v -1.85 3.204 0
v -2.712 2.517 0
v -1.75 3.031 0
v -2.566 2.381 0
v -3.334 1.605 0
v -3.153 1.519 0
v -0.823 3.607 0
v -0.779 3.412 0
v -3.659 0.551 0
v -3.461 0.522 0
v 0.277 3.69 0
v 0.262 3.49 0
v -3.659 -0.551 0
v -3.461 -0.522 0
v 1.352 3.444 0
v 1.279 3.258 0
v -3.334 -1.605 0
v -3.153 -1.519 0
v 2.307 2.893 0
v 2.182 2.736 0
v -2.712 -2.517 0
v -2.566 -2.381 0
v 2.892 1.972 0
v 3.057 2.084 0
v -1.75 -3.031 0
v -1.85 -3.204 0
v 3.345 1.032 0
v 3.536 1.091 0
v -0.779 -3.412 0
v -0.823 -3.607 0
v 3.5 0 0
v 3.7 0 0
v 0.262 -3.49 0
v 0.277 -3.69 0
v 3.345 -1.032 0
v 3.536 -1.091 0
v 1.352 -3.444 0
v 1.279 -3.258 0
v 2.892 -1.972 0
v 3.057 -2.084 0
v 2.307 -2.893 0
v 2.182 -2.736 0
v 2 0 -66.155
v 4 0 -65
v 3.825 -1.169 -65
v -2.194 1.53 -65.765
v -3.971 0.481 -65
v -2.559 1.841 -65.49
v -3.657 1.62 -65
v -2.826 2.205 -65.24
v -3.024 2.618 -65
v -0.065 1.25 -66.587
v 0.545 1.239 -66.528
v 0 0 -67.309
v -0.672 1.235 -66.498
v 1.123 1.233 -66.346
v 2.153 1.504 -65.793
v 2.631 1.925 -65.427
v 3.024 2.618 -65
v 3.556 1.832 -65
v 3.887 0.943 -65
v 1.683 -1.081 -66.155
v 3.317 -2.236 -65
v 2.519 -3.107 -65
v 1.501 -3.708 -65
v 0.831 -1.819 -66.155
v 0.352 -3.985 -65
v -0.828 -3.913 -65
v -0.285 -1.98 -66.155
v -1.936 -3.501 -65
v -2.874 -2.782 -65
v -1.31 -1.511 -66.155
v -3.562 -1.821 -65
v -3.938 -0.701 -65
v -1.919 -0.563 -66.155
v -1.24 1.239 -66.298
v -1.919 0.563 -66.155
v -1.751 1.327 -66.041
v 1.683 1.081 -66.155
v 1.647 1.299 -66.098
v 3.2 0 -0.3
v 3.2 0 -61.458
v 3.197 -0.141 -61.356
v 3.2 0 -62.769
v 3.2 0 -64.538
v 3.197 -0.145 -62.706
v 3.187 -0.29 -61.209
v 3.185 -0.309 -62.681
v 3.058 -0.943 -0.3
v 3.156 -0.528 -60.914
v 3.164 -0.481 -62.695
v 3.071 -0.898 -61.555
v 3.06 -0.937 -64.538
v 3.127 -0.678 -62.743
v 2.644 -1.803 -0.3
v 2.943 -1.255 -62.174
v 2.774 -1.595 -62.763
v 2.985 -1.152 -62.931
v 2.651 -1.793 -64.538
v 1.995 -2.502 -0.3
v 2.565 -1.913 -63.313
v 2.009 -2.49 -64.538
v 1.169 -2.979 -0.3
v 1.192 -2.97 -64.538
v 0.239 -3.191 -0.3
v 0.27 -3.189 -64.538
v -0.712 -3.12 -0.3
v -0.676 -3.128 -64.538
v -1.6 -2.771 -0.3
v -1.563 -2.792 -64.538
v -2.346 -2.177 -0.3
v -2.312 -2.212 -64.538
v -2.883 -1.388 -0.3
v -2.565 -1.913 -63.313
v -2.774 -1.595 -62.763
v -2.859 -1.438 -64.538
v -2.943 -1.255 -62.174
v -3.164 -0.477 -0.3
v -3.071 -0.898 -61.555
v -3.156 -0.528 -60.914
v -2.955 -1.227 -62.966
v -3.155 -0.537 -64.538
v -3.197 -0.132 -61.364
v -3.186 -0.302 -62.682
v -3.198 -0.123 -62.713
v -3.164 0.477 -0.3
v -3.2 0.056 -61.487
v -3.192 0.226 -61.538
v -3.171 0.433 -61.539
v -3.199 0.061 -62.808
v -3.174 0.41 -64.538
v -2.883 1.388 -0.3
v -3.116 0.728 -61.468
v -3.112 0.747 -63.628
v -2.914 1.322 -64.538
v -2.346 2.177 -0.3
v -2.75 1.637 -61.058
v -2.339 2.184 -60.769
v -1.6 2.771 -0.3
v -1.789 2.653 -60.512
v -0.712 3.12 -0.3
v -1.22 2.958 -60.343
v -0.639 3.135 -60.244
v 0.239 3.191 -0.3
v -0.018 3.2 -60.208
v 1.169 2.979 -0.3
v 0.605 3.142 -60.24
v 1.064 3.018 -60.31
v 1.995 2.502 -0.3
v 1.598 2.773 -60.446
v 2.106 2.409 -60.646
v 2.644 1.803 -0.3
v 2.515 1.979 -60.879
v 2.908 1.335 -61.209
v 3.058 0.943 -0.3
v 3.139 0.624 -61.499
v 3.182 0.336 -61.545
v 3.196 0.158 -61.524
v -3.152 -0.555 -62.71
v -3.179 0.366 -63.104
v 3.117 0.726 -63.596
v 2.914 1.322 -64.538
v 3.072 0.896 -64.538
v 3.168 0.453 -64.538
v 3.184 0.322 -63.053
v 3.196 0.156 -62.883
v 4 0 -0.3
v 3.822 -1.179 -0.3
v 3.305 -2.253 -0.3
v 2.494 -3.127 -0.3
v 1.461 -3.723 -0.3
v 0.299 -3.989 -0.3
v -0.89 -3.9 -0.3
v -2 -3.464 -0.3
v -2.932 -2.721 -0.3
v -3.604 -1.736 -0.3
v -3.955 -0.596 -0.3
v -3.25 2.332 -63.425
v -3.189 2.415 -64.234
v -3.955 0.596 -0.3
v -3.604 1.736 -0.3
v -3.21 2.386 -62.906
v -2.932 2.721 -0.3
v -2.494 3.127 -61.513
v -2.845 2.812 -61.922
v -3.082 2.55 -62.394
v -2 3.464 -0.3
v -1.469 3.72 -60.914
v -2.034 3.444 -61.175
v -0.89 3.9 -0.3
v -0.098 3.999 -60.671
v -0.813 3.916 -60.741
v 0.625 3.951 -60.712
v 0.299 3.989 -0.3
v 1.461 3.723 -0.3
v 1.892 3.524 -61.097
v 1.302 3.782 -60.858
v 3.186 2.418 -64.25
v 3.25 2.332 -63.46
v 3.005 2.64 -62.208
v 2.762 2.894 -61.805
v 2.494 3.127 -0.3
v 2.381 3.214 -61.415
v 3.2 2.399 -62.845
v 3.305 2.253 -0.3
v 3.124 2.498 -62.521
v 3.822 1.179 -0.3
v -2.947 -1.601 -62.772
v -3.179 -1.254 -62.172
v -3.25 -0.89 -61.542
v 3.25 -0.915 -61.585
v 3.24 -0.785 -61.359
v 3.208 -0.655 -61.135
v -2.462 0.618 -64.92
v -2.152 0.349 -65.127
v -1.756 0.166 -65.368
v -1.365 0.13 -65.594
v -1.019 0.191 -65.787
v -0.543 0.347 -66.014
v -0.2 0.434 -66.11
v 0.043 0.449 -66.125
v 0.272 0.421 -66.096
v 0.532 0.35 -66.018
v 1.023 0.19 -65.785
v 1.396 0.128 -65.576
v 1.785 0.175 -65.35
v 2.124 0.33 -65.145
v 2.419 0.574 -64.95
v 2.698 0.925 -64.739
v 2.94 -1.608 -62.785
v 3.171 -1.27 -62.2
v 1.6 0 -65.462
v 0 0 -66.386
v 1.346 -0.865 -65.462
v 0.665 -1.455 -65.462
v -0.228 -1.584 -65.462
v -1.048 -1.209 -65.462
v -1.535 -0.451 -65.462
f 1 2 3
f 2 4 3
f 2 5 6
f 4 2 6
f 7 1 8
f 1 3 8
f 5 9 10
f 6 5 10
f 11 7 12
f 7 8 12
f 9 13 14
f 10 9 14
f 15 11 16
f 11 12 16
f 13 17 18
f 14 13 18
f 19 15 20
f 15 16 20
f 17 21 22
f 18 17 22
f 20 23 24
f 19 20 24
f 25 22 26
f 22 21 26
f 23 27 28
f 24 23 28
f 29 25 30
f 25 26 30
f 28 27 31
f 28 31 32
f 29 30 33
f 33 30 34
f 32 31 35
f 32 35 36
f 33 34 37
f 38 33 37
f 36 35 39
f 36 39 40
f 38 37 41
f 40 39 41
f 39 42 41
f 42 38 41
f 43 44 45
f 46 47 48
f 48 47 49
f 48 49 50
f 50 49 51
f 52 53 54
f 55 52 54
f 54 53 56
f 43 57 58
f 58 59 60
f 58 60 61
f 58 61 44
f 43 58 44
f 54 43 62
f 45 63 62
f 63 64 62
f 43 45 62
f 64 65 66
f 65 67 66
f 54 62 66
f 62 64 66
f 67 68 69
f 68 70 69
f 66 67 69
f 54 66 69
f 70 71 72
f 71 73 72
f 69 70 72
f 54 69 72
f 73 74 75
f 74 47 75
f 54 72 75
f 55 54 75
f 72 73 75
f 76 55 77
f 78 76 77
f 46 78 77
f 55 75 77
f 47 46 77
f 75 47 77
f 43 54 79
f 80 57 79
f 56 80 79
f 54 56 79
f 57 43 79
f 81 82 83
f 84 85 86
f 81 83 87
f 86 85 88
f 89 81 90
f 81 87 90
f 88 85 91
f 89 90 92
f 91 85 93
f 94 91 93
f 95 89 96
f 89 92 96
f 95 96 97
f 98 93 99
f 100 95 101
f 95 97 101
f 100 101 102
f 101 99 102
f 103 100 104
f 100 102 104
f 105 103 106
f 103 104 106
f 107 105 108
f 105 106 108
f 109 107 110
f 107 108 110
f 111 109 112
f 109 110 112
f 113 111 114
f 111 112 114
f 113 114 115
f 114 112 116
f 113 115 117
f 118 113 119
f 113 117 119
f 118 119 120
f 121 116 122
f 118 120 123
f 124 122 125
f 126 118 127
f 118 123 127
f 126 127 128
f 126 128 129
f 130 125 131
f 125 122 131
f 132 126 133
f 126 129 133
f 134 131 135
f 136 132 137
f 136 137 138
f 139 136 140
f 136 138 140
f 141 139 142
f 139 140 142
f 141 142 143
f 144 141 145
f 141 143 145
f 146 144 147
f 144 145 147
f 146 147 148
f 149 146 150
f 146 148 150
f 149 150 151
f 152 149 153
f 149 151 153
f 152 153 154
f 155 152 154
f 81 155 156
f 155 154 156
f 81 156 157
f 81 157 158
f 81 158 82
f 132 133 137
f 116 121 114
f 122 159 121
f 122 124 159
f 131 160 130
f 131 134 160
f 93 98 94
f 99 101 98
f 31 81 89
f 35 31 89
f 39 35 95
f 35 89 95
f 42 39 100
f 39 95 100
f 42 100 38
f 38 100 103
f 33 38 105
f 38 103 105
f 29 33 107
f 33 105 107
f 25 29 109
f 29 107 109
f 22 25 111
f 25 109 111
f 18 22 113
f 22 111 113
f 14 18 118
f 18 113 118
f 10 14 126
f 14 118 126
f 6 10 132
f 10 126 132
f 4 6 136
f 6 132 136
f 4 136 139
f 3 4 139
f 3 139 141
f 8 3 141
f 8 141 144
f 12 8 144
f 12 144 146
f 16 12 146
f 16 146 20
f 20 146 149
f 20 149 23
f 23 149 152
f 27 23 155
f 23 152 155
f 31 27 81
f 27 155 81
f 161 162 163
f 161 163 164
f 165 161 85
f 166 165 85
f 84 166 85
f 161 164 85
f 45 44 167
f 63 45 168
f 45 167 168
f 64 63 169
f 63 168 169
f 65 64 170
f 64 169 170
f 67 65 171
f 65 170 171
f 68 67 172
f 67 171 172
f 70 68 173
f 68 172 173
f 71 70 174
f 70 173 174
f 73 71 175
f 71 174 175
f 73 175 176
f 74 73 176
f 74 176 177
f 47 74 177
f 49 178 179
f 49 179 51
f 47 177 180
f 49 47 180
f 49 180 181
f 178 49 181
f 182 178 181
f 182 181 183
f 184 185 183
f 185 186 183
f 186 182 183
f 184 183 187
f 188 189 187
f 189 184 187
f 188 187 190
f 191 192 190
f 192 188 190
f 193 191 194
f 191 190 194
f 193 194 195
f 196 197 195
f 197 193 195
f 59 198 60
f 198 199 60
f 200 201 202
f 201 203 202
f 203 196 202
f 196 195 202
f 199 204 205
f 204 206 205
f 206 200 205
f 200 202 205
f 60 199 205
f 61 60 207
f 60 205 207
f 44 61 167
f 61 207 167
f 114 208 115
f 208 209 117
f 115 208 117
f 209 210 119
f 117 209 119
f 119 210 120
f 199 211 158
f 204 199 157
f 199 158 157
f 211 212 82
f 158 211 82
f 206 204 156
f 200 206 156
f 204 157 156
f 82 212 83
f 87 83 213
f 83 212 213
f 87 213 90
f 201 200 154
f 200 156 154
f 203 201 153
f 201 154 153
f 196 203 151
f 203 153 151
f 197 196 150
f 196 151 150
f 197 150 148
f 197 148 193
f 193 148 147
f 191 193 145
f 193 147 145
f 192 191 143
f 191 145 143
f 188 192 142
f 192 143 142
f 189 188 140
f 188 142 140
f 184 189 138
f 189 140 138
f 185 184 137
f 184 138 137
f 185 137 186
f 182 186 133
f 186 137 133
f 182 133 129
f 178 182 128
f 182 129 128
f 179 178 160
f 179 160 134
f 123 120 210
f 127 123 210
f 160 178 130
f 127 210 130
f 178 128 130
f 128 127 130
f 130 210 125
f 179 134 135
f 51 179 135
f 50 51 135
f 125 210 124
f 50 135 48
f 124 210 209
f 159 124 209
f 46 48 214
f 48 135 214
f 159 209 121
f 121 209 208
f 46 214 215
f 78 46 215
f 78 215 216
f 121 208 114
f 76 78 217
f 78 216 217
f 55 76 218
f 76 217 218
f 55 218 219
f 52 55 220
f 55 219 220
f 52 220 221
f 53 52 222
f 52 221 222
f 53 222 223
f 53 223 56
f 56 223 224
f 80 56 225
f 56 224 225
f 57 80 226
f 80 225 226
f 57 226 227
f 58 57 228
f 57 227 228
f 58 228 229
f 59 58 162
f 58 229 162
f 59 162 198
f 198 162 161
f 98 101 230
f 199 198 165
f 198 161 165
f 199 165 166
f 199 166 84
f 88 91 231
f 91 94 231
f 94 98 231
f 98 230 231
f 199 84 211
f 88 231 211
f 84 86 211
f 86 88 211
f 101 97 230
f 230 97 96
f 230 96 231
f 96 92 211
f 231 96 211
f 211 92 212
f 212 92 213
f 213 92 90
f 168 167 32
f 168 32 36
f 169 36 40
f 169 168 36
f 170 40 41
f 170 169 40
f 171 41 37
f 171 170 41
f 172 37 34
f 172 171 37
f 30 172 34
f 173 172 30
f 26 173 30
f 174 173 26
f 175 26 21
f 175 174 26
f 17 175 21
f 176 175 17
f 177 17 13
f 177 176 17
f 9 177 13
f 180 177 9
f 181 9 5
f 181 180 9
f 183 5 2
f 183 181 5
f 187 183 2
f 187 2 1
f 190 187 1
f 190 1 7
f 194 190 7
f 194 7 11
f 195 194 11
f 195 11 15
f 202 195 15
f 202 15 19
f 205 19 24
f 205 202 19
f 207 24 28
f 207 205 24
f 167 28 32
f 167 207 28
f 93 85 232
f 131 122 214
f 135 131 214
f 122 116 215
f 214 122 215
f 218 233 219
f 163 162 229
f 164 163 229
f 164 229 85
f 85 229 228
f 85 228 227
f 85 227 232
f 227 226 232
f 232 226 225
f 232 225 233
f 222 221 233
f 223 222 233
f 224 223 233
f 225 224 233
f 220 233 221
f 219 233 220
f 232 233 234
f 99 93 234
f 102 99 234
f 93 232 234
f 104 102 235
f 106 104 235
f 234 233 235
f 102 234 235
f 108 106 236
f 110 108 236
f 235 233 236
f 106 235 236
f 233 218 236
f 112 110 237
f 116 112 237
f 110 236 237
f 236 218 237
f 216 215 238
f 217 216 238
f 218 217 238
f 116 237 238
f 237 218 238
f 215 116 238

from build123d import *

# Parameters (mm, degrees)
F4_SIZE  = 0.3
F6_START = -30
F5_R     = 3.25
F6_DEPTH = 7.1198021535


with BuildPart() as f3:
    # F2 (on Front) → F3 (revolve)
    with BuildSketch(Plane.XZ):
        Polygon((4, 0), (3.2, 0), (3.2, -64.5381197846), (0, -66.3856406461), (0, -67.3094010768), (4, -65), align=None)
    revolve(axis=Axis((0, 0, -32.7149666846), (0, 0, -1)))

    # F4
    f4_edges = [f3.edges().sort_by_distance(p)[0] for p in [
        (-4, 0, 0),
        (-3.2, 0, 0),
    ]]
    chamfer(f4_edges, length=F4_SIZE)

    # F5 (on line) → F6 (cut)
    with BuildSketch(Plane(origin=(0, 0, 0), x_dir=(1, 0, 0), z_dir=(0, -0.8660254038, 0.5)).offset(F6_START)):
        with Locations((0, -53.791651246)):
            Circle(F5_R)
    extrude(amount=-F6_DEPTH, mode=Mode.SUBTRACT)


solid = f3.part
